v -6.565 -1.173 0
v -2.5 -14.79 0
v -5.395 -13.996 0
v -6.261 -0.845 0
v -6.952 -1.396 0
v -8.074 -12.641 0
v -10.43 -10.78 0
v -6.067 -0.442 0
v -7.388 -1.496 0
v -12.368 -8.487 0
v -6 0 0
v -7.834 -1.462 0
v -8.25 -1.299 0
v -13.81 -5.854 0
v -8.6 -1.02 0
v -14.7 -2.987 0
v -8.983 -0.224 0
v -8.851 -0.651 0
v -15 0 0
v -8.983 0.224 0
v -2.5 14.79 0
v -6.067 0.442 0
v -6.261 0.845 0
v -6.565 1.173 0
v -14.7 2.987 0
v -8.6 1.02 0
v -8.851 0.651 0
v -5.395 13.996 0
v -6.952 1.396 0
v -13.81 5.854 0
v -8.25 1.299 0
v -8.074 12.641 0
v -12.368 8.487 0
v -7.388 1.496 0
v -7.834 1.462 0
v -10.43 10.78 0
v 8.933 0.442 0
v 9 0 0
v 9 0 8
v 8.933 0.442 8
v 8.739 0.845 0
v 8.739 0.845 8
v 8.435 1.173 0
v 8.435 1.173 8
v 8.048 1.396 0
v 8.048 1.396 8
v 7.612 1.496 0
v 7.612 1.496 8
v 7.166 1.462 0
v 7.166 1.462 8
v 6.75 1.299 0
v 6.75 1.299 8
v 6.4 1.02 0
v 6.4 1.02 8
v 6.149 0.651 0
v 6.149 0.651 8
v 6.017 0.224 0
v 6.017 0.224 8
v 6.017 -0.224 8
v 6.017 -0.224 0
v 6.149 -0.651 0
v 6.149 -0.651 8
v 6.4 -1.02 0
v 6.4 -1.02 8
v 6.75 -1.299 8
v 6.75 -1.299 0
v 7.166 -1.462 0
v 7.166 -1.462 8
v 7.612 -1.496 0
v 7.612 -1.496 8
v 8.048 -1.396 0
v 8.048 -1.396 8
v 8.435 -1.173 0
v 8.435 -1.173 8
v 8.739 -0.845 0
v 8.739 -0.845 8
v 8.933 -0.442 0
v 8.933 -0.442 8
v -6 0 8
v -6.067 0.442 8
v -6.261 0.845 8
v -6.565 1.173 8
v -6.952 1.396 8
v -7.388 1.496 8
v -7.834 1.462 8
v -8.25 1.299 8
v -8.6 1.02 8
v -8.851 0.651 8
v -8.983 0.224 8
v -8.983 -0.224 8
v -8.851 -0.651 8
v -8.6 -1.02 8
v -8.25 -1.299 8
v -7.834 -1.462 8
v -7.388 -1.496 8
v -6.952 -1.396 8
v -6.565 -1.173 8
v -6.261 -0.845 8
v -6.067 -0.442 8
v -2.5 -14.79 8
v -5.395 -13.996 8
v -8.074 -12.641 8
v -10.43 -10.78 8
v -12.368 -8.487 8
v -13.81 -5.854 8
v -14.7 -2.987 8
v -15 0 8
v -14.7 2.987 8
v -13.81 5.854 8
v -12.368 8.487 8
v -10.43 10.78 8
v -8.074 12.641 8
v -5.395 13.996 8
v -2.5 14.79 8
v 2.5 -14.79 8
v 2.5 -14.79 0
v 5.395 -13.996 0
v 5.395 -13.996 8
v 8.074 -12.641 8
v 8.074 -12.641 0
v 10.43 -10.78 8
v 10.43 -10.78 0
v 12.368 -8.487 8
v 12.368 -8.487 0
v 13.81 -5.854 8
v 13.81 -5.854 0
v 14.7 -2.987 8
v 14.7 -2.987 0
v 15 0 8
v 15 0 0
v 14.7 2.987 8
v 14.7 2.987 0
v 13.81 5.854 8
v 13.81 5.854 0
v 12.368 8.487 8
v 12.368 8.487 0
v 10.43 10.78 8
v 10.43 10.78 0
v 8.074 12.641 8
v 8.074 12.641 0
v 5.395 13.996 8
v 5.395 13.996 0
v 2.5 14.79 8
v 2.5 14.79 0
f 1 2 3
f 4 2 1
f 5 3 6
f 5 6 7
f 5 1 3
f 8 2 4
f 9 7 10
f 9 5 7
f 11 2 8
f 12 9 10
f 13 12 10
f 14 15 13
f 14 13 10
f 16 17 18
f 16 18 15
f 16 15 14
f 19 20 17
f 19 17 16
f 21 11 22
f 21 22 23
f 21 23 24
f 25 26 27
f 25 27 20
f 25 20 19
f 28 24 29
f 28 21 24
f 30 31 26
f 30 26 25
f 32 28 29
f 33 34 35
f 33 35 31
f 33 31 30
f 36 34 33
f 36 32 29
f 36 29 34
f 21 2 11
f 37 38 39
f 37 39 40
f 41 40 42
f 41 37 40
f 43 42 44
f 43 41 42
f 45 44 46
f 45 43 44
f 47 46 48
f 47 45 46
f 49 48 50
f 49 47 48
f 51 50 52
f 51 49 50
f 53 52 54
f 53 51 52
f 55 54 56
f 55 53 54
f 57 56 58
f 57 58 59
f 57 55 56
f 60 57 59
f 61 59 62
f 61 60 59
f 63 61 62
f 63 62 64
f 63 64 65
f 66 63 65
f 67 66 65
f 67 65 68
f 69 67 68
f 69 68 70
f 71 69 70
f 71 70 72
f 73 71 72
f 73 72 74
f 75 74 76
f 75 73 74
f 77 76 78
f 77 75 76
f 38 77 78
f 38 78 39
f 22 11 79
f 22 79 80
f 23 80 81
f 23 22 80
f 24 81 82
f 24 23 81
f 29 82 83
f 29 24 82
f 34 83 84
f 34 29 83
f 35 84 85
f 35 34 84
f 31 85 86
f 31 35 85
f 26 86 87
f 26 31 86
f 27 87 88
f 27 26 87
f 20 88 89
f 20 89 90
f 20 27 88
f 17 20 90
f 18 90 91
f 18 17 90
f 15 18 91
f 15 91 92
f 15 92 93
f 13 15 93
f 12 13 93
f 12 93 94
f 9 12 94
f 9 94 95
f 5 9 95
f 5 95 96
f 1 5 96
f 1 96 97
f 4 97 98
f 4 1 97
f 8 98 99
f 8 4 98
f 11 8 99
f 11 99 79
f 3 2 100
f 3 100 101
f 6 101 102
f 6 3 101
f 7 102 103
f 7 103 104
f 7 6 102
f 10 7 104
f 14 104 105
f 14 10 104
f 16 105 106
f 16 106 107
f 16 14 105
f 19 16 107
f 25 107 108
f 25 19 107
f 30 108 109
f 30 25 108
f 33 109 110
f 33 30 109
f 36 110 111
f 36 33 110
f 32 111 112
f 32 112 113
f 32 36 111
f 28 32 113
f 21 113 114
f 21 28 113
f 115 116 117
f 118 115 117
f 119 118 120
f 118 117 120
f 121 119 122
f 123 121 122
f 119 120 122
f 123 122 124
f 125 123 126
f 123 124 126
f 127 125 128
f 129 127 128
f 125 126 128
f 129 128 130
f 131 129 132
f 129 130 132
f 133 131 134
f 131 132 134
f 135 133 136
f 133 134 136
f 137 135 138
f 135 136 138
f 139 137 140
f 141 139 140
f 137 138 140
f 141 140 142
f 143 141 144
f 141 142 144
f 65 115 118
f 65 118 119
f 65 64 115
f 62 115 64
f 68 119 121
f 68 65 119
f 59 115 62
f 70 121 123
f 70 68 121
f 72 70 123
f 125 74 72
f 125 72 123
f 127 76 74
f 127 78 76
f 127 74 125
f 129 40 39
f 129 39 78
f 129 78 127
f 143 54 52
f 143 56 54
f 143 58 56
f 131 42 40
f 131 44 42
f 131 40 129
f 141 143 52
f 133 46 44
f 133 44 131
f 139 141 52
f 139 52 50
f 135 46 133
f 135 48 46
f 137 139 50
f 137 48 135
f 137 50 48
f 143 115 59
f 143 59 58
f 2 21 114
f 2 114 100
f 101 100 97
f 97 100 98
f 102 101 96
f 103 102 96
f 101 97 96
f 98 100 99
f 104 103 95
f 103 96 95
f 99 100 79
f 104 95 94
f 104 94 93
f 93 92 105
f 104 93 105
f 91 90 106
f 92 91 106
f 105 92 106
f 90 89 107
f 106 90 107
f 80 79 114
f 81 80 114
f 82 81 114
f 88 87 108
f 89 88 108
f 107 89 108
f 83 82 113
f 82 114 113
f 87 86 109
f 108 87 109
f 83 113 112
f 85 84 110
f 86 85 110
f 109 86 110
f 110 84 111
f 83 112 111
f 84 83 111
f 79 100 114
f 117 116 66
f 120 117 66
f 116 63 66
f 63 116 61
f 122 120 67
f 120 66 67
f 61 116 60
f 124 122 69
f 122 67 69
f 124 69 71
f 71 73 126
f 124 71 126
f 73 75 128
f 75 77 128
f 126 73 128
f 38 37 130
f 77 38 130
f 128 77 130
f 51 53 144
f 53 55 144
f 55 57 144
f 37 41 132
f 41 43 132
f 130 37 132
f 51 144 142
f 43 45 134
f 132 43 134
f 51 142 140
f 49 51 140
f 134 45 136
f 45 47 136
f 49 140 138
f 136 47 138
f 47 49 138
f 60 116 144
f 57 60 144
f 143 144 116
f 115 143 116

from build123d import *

# Parameters (mm, degrees)
SKETCH1_R             = 1.5
BOSS_EXTRUDE1_DEPTH   = 8
BOSS_EXTRUDE1_2_DEPTH = 8


with BuildPart() as part:
    # Sketch1 → Boss-Extrude1 (new body)
    with BuildSketch(Plane.XY):
        with BuildLine():
            Line((2.5, 0), (2.5, -14.790199458))
            ThreePointArc((2.5, -14.790199458), (15, 0), (2.5, 14.790199458))
            Line((2.5, 14.790199458), (2.5, 0))
        make_face()
        with Locations((7.5, 0)):
            Circle(SKETCH1_R, mode=Mode.SUBTRACT)
    extrude(amount=BOSS_EXTRUDE1_DEPTH)


with BuildPart() as body_2:
    # Sketch1 → Boss-Extrude1 2 (new body)
    with BuildSketch(Plane.XY):
        with BuildLine():
            Line((-2.5, 0), (-2.5, -14.790199458))
            ThreePointArc((-2.5, -14.790199458), (-15, 0), (-2.5, 14.790199458))
            Line((-2.5, 14.790199458), (-2.5, 0))
        make_face()
        with Locations((-7.5, 0)):
            Circle(SKETCH1_R, mode=Mode.SUBTRACT)
    extrude(amount=BOSS_EXTRUDE1_2_DEPTH)


solid = Compound([part.part, body_2.part])
